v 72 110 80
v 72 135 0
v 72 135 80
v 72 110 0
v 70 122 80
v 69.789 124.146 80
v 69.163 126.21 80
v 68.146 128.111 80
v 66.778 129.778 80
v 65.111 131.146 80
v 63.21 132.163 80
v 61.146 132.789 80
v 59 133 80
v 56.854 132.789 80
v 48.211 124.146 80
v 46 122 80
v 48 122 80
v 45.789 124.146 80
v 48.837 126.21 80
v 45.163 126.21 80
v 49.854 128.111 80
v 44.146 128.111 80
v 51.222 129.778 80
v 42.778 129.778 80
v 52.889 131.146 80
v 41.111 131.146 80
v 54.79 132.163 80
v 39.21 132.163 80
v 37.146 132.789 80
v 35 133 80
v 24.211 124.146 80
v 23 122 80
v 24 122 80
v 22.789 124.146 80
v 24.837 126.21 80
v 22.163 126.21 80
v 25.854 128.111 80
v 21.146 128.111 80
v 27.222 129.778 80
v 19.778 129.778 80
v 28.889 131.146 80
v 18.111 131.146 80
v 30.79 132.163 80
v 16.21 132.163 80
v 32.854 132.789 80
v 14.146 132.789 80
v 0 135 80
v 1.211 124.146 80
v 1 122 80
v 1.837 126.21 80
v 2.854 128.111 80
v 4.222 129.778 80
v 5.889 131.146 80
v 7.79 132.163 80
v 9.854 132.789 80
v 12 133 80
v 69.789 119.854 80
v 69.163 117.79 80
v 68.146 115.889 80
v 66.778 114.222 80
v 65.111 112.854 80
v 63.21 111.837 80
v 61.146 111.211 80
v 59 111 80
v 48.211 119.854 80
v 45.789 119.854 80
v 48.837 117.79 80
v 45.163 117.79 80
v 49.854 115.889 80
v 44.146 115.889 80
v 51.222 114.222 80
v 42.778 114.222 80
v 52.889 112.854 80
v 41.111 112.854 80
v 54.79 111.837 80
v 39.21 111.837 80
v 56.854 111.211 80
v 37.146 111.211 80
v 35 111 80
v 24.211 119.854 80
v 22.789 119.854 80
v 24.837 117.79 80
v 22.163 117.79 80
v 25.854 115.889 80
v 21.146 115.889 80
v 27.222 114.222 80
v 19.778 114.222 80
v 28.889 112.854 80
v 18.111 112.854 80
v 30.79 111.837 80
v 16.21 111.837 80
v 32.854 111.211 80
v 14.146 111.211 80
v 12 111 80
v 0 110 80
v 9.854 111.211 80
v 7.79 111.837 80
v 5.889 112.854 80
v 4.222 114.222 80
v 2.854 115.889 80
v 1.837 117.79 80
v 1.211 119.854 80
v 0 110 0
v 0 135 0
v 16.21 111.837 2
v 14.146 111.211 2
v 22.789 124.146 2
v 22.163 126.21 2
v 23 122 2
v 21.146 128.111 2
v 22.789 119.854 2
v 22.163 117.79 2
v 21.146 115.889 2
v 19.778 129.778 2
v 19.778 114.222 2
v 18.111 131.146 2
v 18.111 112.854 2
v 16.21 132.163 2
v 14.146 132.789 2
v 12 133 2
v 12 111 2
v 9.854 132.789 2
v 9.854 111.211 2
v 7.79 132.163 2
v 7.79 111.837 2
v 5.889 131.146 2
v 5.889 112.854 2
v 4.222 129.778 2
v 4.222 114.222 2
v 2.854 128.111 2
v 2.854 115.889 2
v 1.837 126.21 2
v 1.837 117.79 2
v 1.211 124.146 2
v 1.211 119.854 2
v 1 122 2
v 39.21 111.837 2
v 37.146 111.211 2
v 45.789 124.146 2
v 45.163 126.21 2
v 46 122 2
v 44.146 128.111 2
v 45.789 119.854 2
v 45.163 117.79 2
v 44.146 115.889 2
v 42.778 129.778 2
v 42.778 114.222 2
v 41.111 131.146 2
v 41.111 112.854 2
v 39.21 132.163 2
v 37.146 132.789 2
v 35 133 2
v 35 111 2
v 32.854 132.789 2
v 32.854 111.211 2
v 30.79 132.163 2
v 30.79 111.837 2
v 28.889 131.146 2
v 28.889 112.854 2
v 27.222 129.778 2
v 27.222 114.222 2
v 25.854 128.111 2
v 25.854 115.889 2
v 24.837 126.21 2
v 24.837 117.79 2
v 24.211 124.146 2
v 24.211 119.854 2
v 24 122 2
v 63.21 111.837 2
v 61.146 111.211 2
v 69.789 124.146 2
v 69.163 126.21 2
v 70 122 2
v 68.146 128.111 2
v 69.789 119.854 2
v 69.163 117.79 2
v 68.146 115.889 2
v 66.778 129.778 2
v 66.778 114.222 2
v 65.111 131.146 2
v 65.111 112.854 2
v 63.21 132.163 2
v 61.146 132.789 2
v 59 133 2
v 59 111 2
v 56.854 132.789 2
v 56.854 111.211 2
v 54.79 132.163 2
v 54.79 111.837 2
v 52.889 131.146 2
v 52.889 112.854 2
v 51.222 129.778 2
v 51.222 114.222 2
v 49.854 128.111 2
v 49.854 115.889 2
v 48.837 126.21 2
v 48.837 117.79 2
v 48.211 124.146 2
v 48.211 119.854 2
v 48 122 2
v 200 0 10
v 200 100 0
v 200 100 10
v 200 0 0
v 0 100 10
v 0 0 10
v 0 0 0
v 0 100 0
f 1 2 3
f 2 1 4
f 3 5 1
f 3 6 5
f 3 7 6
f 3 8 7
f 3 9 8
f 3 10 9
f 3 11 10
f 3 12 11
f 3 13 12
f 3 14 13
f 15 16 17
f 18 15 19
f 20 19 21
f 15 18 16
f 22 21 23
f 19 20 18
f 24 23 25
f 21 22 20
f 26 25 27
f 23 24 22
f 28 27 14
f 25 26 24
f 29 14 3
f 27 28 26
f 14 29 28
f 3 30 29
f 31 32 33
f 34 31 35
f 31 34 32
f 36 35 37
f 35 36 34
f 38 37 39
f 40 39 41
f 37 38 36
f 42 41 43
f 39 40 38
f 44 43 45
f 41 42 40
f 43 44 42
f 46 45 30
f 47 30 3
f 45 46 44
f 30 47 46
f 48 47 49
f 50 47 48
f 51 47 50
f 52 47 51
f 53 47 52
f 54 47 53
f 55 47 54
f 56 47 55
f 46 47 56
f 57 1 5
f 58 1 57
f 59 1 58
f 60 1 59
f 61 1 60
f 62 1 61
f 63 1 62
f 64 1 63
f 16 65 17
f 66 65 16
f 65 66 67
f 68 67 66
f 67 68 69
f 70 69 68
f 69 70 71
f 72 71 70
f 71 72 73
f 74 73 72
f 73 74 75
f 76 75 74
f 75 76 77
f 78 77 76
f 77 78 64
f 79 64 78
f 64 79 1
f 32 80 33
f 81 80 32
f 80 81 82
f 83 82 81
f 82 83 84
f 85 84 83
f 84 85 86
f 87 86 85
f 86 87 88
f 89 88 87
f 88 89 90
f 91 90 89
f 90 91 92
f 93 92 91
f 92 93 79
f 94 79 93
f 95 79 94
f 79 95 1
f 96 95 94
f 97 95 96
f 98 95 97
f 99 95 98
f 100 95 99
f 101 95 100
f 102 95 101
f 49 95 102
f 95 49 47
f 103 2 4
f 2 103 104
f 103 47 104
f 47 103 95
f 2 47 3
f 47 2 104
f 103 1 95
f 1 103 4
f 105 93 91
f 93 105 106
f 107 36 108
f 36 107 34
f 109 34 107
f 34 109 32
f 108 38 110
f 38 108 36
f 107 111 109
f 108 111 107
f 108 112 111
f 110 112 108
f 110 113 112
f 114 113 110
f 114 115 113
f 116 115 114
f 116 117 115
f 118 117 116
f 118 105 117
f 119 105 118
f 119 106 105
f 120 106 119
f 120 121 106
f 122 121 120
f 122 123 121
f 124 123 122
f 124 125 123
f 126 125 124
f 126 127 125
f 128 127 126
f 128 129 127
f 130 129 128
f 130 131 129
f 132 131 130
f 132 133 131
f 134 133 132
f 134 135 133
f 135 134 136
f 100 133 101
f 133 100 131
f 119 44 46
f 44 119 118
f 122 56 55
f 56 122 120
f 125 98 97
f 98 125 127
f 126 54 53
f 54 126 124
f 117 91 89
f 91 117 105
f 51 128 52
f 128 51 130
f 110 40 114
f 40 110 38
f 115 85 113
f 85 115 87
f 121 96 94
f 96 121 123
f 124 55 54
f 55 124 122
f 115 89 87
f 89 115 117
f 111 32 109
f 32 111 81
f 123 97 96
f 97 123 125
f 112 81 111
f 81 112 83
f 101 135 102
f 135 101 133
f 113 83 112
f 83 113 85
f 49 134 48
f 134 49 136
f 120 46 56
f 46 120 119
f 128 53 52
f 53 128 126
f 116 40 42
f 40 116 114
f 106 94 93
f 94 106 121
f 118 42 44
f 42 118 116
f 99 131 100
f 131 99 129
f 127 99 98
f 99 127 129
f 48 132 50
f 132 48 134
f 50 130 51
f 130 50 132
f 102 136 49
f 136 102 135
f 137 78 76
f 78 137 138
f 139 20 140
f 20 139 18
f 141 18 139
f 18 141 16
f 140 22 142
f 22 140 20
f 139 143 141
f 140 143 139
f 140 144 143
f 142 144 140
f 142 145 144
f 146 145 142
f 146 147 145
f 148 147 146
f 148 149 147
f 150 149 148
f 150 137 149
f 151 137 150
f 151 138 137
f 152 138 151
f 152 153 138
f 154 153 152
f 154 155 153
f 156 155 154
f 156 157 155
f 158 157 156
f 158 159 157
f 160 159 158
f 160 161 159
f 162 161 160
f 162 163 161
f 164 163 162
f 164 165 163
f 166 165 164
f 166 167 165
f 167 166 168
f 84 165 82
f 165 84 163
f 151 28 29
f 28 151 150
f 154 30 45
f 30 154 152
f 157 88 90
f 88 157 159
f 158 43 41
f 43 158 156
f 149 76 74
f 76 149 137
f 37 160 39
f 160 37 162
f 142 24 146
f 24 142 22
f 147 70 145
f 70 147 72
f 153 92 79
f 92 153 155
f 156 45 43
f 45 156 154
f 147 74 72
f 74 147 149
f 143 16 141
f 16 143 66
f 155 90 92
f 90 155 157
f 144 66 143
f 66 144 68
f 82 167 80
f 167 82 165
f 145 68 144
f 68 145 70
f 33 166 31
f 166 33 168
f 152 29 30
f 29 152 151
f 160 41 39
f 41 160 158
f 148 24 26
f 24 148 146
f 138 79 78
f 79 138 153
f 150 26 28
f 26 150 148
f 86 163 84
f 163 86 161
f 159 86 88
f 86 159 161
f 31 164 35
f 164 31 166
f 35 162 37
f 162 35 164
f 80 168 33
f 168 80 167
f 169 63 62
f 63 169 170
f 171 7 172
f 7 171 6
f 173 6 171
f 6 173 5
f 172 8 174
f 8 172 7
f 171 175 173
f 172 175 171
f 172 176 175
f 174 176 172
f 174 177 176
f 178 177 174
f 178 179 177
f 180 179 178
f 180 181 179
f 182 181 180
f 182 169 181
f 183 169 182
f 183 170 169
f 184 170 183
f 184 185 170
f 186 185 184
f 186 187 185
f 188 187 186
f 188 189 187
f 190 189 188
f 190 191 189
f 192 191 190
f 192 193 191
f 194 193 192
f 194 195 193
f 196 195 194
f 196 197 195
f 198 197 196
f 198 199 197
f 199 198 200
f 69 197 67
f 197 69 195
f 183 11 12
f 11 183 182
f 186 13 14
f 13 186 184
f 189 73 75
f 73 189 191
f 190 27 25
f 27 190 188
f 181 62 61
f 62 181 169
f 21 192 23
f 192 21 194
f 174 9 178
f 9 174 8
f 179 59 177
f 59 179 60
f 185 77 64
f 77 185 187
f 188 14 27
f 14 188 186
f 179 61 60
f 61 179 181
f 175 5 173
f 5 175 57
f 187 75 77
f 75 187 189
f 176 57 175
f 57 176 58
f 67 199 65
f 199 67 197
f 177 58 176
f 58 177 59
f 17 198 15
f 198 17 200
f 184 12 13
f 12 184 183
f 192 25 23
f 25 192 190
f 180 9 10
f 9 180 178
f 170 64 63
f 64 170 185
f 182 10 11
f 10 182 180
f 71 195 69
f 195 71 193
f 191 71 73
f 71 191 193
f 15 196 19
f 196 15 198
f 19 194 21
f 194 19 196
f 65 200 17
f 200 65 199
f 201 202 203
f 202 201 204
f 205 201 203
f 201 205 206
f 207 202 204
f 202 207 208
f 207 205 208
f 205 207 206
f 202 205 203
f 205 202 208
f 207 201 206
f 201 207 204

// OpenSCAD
cube([200, 100, 10]);

translate([0, 110, 0]) difference() {
    cube([72, 25, 80]);
    translate([11+1, 11+1, 2]) cylinder($fn=32, h=100, d=22);
    translate([22+2+11, 11+1, 2]) cylinder($fn=32, h=100, d=22);
    translate([2*(22+2)+11, 11+1, 2]) cylinder($fn=32, h=100, d=22);
}
